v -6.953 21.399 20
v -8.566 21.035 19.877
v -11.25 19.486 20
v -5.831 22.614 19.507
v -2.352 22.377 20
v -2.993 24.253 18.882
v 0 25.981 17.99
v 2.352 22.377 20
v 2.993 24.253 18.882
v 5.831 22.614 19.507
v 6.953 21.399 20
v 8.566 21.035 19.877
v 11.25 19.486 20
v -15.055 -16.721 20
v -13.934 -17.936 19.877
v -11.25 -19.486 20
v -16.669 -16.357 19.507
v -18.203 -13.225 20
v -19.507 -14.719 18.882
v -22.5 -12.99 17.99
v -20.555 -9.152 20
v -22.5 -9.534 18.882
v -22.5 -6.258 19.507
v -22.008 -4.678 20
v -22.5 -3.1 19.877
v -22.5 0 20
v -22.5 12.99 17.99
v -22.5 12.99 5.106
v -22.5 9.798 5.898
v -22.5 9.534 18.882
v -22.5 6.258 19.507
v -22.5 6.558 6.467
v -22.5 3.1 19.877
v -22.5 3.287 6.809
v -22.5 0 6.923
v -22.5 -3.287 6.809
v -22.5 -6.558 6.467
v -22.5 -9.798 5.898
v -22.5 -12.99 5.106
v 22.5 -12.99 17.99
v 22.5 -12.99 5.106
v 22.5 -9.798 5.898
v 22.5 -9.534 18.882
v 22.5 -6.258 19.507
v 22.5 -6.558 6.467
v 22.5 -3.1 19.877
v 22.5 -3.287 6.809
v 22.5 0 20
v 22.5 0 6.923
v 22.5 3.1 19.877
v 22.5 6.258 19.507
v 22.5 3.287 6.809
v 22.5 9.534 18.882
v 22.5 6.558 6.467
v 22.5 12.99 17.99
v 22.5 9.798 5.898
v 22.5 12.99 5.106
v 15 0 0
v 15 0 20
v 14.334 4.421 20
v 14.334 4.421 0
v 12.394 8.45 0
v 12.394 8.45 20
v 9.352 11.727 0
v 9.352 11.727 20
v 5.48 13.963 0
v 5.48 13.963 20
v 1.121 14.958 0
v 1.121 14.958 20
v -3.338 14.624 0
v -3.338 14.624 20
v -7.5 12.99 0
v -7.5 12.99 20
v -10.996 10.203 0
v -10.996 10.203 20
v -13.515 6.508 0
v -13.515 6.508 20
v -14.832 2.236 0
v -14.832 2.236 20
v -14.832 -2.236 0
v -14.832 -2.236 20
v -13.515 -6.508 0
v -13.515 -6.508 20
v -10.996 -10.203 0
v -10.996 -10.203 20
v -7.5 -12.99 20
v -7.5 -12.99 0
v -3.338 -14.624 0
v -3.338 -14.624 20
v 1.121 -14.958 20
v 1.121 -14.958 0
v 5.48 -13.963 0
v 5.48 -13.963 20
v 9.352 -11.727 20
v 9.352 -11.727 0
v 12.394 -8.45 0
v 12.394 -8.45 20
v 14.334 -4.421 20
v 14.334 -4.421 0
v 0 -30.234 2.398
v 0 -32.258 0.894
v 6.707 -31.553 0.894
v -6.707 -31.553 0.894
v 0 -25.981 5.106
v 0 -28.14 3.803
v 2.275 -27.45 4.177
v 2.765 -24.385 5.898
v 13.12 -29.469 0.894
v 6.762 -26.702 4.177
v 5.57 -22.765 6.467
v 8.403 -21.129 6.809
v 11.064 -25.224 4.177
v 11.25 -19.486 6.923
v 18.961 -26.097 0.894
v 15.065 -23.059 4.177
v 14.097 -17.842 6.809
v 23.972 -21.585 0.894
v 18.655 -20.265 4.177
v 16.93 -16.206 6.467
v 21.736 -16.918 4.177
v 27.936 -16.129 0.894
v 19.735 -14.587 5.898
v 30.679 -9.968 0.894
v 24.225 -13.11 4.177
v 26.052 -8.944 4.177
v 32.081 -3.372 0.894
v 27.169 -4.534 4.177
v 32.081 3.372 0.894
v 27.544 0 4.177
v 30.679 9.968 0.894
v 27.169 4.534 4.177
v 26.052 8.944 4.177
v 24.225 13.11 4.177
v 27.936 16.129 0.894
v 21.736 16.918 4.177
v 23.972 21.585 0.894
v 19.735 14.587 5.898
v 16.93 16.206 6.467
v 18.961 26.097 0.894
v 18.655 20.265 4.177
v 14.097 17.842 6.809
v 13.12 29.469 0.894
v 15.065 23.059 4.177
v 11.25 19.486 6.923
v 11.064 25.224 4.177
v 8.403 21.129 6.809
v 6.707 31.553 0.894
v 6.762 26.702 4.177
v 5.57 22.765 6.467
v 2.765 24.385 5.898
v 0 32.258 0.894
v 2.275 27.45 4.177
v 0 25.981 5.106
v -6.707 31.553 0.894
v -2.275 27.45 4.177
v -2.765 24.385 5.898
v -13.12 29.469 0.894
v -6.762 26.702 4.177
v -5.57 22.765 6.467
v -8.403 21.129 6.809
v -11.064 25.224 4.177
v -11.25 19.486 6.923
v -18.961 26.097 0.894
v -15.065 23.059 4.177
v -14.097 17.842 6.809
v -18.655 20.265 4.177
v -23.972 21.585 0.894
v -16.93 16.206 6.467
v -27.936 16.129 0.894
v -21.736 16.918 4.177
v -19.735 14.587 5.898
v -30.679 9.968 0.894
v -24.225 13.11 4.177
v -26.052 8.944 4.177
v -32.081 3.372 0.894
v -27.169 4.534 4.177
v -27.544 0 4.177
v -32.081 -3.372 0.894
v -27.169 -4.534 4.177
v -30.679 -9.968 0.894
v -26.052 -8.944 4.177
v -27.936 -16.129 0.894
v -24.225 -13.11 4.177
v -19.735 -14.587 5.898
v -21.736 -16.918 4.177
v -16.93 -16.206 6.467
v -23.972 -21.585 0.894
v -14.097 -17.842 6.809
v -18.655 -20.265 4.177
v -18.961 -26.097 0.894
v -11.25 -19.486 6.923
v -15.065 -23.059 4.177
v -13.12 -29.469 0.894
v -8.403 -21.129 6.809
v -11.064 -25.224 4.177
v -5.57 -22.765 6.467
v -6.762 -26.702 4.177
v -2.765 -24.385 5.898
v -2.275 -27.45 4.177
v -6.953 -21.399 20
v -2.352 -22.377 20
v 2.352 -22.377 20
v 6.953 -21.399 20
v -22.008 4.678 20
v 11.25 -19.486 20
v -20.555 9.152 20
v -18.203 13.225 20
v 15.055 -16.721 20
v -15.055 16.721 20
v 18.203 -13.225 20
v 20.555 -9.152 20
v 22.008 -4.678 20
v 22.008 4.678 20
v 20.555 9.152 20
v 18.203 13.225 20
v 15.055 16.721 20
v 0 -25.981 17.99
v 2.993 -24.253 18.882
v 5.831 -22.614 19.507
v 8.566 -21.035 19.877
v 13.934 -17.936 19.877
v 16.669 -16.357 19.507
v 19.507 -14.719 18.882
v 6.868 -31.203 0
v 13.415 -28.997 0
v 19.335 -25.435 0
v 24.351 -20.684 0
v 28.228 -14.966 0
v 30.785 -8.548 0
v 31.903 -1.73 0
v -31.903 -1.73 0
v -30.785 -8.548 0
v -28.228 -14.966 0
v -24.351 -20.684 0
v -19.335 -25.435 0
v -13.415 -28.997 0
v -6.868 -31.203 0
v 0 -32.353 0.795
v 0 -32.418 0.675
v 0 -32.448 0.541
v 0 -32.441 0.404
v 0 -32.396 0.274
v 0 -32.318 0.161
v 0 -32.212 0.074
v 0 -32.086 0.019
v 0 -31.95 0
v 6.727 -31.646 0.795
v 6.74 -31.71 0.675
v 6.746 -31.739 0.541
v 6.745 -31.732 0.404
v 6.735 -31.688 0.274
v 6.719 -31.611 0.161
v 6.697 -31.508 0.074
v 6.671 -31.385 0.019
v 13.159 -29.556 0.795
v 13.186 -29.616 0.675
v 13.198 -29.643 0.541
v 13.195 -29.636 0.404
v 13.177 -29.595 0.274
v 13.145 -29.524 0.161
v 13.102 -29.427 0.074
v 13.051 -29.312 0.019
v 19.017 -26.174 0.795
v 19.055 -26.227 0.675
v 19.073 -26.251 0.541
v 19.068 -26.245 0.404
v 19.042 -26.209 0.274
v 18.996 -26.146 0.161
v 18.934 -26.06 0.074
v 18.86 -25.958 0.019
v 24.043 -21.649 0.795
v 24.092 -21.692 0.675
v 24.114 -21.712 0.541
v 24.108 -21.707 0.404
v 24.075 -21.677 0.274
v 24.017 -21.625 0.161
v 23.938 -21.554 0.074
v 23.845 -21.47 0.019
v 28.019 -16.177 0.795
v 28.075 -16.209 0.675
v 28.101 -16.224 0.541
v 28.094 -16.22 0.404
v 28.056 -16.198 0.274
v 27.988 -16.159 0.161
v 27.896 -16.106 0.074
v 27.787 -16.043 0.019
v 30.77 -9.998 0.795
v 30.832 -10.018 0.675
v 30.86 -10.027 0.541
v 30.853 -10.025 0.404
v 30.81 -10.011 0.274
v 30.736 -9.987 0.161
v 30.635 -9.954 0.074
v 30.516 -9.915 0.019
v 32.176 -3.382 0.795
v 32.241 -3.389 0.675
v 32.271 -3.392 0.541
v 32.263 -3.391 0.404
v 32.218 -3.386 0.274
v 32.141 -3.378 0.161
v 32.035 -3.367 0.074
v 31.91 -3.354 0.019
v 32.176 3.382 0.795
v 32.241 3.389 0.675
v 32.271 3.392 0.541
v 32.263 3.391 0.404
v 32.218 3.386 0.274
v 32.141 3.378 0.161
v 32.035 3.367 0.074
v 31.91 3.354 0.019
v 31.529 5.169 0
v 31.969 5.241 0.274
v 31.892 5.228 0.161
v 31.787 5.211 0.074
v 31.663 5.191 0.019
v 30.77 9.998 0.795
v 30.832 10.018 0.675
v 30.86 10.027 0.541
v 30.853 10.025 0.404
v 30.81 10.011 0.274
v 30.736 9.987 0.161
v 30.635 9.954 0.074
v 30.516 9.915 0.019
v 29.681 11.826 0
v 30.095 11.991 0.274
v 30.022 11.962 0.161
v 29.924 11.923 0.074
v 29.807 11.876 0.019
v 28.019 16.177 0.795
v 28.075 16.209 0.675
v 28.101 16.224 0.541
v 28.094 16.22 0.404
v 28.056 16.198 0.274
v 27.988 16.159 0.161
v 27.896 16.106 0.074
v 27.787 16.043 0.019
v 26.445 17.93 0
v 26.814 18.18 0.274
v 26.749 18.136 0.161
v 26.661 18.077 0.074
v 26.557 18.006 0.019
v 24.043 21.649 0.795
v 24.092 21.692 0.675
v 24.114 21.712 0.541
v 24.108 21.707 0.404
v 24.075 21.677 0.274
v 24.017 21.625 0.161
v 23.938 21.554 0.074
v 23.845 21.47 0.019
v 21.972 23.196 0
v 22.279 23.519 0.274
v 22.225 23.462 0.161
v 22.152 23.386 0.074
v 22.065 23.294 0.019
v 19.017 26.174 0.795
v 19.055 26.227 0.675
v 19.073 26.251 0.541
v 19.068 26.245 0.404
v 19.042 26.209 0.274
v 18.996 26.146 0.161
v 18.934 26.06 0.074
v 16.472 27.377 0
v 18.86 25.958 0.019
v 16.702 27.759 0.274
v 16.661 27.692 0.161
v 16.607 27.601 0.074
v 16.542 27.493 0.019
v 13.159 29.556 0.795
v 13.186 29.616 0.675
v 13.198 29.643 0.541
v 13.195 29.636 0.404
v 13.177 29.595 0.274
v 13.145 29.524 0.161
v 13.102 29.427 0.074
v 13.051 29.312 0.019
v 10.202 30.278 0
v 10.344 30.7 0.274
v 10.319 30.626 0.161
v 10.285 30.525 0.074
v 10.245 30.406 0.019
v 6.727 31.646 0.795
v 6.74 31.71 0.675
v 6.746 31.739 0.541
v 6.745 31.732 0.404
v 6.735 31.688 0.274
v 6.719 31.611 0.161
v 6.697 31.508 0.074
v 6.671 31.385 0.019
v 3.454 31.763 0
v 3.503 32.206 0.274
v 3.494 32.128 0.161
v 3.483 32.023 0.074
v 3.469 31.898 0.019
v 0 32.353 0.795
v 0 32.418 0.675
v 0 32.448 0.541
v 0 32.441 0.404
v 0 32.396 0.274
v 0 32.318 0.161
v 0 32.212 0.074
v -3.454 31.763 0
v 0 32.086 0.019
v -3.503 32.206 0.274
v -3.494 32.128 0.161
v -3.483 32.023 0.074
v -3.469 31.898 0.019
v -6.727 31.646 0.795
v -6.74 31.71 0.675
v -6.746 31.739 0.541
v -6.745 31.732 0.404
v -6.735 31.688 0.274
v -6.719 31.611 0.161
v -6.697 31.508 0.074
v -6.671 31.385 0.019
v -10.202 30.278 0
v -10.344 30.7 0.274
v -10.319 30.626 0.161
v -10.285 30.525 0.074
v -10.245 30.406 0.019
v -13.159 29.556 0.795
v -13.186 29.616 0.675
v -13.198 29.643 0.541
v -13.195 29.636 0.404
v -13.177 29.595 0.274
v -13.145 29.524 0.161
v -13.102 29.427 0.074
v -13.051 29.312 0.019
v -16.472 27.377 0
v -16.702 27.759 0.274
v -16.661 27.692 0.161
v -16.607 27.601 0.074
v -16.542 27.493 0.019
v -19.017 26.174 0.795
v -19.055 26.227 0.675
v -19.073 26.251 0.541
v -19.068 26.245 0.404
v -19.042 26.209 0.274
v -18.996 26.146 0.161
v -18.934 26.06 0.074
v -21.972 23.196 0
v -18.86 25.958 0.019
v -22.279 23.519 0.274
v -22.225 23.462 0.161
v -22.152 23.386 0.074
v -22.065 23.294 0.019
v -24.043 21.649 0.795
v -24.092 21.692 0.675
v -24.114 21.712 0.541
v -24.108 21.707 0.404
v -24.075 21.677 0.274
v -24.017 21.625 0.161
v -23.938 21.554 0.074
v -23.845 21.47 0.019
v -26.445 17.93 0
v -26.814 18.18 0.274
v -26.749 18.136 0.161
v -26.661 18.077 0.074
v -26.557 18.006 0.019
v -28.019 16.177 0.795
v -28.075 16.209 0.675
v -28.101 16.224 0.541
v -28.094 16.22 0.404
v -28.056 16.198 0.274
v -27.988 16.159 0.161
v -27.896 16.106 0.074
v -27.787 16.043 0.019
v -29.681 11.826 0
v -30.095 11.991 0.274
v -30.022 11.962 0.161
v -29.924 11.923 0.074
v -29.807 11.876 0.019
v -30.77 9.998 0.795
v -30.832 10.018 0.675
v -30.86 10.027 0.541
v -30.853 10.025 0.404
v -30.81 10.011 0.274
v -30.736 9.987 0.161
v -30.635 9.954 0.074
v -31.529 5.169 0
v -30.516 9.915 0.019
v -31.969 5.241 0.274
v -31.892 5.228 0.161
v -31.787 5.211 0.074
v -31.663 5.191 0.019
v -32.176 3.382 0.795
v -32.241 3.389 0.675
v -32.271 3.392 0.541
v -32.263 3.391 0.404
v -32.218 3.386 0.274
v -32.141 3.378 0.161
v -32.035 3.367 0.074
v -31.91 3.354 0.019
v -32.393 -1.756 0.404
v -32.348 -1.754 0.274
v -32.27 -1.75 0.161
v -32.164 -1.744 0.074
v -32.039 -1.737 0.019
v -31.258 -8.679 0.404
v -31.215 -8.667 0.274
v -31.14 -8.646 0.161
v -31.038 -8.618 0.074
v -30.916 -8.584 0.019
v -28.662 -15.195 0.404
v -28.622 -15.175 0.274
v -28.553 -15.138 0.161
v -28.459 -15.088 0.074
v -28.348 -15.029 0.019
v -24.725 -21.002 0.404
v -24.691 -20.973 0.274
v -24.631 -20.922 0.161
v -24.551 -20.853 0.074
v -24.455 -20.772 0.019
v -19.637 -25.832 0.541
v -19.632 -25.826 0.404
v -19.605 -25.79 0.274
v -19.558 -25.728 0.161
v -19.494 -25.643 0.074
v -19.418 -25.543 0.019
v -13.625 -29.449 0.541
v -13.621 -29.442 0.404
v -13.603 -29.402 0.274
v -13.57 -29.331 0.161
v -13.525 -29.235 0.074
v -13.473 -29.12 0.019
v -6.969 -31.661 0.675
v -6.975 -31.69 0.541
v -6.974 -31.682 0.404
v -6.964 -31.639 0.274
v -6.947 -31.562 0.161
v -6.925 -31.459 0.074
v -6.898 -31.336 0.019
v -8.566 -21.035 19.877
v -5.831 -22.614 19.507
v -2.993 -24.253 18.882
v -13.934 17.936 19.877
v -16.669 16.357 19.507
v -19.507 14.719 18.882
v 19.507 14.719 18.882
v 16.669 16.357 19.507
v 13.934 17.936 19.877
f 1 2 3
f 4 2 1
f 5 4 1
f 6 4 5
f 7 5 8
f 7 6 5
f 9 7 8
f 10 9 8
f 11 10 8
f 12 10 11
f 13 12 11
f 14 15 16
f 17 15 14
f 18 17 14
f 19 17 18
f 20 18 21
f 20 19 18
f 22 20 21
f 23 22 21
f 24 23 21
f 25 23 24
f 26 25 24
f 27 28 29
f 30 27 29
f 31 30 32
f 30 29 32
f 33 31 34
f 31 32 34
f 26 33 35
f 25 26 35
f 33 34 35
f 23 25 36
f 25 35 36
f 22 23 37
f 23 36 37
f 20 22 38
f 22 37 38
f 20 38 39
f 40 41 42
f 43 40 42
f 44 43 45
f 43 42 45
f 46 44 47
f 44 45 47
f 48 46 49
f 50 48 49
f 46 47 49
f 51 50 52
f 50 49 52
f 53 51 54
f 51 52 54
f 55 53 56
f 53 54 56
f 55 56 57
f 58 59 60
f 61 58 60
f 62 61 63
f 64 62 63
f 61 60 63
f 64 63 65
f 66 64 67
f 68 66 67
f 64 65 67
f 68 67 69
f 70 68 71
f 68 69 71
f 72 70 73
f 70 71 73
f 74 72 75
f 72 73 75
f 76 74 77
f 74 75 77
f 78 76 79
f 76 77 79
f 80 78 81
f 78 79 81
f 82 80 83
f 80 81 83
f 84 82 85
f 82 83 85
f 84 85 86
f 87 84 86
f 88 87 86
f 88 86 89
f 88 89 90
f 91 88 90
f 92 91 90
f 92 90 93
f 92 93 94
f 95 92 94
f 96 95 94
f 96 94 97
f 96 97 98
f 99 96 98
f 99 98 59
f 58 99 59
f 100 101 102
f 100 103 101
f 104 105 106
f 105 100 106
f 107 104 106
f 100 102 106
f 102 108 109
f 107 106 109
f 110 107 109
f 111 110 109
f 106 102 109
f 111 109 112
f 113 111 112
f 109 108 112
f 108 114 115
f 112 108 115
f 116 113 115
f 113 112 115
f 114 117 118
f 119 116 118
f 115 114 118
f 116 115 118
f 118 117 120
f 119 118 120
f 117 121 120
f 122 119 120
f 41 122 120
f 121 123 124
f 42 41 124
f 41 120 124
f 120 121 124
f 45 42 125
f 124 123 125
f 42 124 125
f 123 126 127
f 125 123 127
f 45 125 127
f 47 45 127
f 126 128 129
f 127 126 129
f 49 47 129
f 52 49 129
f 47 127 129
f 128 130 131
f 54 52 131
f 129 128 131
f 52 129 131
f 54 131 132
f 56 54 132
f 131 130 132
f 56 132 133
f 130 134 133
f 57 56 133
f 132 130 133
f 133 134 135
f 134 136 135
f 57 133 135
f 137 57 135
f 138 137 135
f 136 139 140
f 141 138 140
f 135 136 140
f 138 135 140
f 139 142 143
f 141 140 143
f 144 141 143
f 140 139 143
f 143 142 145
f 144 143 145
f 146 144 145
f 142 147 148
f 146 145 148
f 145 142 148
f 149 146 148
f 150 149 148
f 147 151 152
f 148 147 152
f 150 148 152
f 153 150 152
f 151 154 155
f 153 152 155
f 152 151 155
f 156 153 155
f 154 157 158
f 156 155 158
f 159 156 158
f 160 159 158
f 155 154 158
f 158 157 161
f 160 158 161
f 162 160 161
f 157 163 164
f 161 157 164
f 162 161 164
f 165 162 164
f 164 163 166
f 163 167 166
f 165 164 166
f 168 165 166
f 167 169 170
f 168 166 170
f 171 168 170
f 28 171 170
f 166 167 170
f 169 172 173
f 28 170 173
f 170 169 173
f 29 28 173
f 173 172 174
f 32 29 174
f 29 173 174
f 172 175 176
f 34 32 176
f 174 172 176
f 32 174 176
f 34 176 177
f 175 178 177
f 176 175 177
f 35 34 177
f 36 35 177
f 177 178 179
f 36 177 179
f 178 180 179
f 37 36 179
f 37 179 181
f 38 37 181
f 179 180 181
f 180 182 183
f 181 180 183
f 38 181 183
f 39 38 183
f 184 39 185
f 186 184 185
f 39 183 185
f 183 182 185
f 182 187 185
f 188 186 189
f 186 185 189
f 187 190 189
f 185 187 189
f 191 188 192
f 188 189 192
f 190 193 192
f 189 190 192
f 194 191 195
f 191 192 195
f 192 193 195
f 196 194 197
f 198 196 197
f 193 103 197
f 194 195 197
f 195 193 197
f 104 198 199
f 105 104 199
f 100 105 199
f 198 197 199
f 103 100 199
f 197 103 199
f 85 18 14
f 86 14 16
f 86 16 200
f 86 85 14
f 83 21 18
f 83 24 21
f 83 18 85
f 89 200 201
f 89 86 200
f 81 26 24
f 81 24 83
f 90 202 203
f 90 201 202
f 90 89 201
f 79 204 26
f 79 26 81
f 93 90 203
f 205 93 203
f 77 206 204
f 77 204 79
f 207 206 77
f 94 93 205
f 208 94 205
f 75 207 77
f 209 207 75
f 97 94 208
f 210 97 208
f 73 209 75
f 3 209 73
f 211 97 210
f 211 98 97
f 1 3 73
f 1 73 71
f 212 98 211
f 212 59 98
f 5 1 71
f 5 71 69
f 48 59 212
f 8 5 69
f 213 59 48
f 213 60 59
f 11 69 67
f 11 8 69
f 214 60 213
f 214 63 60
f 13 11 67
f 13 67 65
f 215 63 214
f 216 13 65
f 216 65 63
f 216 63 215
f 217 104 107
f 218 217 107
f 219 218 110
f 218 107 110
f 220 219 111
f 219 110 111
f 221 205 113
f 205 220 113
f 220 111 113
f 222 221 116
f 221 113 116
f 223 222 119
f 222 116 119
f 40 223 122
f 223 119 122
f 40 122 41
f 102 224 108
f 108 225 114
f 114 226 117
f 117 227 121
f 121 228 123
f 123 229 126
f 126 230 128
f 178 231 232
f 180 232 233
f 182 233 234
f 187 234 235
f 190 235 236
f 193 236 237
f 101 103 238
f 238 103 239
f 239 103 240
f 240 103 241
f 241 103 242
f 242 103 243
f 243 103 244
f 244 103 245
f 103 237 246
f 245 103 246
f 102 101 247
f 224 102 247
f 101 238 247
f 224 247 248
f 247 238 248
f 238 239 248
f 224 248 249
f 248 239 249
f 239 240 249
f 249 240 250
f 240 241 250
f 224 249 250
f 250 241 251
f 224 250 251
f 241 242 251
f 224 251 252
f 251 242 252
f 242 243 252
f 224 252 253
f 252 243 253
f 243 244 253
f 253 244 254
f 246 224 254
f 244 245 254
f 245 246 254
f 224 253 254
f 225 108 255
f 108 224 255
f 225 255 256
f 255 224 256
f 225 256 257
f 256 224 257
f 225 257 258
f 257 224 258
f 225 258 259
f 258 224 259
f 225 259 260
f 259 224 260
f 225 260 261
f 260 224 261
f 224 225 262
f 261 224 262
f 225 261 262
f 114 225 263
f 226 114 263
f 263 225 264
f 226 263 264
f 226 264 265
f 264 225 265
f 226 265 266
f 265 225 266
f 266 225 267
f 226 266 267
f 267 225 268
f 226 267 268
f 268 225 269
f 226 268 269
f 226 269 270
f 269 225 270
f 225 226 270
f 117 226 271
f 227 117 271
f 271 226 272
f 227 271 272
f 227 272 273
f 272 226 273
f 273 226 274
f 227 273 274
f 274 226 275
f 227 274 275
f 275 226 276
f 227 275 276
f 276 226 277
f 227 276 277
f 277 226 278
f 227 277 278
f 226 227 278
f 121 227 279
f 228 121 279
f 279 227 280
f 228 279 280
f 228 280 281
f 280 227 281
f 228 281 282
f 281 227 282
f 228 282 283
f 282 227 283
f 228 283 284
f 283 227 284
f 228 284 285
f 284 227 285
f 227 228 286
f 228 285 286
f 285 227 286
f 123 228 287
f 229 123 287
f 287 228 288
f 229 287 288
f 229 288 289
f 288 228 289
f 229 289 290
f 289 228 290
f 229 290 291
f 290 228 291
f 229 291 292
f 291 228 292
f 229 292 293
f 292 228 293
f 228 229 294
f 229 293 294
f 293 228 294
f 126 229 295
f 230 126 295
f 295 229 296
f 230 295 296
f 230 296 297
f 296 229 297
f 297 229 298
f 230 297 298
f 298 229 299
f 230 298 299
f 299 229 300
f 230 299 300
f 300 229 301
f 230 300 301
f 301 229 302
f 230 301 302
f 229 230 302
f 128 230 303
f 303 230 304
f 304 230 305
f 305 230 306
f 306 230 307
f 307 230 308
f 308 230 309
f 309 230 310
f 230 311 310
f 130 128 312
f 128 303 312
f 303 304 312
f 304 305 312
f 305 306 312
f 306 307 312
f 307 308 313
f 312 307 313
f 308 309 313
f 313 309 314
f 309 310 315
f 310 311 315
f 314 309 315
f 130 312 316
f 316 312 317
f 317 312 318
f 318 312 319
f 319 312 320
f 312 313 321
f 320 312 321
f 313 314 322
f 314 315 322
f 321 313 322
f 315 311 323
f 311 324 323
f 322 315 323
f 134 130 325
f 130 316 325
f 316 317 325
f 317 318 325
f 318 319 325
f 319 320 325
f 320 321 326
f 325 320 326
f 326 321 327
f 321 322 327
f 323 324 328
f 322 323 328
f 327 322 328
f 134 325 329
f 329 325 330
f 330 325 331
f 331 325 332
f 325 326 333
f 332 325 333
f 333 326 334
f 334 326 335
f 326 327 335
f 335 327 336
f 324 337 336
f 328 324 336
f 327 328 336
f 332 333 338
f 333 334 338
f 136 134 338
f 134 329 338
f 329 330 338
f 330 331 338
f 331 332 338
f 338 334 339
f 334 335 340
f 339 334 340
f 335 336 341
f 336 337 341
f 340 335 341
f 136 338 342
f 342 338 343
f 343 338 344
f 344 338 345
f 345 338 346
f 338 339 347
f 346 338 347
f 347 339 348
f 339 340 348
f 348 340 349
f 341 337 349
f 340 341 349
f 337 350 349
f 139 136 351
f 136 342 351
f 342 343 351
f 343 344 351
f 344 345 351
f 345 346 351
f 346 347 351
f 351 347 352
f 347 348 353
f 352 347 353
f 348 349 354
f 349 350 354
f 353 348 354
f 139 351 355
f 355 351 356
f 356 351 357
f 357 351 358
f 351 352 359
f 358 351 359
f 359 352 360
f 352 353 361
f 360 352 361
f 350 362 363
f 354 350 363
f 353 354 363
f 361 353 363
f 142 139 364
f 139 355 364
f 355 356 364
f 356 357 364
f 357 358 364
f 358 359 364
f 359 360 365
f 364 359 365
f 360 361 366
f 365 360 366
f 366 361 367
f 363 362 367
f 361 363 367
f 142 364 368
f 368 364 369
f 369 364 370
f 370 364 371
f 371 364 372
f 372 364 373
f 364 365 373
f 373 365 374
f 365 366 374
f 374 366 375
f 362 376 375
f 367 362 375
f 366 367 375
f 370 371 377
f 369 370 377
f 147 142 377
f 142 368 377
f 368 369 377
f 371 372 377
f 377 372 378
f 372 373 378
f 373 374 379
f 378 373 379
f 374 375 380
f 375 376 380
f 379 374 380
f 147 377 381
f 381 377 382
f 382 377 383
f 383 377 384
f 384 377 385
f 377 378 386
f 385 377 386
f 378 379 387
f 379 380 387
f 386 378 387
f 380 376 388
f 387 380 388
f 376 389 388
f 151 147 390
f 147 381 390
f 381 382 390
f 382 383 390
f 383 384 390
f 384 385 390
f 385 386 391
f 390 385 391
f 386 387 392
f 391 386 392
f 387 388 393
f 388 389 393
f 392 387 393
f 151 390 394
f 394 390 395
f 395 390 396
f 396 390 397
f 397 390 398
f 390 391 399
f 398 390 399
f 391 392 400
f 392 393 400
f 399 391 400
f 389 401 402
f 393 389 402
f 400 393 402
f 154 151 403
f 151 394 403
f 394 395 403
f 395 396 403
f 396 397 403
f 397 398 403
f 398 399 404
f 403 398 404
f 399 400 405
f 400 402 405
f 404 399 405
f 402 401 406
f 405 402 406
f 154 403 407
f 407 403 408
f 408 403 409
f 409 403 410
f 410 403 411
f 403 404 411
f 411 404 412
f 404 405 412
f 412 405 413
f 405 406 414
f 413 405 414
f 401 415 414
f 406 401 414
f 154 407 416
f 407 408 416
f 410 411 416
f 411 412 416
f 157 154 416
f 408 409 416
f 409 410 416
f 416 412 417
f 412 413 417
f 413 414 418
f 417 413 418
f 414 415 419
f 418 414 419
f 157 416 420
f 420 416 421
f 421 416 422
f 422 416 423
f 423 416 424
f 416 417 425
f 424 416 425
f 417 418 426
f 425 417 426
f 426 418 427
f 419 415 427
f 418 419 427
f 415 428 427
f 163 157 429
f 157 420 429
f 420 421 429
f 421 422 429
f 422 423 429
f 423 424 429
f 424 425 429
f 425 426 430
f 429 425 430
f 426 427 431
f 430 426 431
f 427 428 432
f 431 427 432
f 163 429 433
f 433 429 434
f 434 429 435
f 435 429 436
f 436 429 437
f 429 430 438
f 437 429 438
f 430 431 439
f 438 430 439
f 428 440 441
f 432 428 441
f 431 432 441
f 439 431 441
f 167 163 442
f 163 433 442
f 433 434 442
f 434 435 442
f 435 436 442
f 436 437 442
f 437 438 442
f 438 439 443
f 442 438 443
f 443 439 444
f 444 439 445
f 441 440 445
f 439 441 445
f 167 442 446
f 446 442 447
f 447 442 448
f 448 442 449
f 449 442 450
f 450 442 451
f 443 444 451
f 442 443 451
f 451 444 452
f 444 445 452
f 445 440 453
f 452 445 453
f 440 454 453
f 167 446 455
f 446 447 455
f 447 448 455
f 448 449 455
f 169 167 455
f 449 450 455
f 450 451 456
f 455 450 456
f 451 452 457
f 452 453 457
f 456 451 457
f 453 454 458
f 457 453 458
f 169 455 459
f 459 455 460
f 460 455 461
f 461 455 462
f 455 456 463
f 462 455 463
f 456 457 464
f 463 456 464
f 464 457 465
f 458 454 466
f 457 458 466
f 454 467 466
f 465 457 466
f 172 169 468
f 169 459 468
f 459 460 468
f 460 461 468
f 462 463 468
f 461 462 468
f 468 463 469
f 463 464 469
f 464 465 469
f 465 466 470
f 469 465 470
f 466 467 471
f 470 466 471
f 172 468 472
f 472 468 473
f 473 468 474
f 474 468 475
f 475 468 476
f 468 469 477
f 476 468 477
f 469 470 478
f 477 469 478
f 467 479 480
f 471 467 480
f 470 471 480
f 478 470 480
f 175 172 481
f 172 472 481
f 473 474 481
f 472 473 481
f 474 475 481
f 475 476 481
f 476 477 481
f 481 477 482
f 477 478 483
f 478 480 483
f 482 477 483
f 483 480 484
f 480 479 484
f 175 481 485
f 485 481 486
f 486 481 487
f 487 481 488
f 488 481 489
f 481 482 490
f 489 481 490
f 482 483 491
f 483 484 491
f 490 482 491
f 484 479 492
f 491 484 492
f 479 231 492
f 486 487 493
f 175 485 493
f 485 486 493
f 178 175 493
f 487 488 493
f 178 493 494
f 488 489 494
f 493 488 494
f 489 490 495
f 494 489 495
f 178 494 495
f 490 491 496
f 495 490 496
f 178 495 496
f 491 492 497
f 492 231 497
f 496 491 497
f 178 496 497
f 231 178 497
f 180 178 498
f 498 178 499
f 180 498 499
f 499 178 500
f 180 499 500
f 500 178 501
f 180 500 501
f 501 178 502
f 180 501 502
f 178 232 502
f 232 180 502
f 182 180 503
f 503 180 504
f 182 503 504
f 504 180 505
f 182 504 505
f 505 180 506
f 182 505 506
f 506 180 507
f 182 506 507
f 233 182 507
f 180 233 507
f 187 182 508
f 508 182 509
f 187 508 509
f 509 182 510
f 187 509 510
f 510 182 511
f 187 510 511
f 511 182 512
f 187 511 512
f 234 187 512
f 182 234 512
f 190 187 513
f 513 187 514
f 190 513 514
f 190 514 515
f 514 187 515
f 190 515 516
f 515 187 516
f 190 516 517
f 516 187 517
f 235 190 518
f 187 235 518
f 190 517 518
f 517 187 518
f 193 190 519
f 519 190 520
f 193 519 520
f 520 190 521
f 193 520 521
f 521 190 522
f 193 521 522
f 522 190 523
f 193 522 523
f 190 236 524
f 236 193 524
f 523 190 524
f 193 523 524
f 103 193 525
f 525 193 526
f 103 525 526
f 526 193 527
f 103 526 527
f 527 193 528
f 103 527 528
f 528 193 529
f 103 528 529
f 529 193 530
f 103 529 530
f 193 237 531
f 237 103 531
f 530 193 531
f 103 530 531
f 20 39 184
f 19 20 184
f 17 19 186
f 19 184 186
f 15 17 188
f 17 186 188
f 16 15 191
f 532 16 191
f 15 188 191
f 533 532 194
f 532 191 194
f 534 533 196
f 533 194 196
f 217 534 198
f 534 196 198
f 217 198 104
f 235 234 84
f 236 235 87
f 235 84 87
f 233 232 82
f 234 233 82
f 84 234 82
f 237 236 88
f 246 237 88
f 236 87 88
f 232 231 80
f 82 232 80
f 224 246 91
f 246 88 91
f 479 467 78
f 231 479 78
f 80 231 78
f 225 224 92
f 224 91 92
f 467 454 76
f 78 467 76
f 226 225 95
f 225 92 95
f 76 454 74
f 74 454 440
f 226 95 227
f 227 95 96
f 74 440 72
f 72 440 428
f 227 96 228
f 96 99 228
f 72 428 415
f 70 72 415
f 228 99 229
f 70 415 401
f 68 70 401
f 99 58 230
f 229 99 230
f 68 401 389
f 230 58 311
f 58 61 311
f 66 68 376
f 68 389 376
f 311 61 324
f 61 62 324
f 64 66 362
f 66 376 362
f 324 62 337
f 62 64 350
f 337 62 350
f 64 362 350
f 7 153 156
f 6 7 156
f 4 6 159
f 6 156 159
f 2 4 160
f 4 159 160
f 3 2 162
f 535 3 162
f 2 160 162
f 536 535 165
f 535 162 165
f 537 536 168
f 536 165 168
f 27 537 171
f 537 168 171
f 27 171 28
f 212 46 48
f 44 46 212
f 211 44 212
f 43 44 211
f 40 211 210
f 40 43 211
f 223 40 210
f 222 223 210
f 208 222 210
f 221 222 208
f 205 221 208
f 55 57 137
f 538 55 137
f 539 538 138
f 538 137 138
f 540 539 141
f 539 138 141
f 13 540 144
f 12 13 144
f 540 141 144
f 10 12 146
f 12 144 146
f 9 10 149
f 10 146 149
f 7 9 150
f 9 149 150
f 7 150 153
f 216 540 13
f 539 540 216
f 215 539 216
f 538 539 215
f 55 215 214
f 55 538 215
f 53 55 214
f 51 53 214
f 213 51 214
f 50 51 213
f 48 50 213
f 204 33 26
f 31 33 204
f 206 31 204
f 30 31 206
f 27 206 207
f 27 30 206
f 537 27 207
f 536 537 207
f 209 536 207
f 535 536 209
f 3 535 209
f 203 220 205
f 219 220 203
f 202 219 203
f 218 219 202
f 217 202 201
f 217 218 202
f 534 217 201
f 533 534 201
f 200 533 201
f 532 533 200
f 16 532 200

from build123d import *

# Parameters (mm, degrees)
BOSS_EXTRUDE1_DEPTH = 20
SKETCH3_OUTSIDE_W   = 154.97
SKETCH3_OUTSIDE_H   = 154.97
SKETCH3_OUTSIDE_R   = 22.5
CUT_EXTRUDE1_DEPTH  = 20
CUT_EXTRUDE1_TAPER  = 60
CUT_EXTRUDE2_REACH  = 22
SKETCH4_R           = 15


with BuildPart() as part:
    # Sketch1 → Boss-Extrude1 (new body)
    with BuildSketch(Plane.XY):
        Polygon((0, 25.980762114), (-22.5, 12.990381057), (-22.5, -12.990381057), (0, -25.980762114), (22.5, -12.990381057), (22.5, 12.990381057), align=None)
    extrude(amount=BOSS_EXTRUDE1_DEPTH)

    # Sketch2 → Revolve2 (revolve)
    with BuildSketch(Plane(origin=(0, 0, 0), x_dir=(0, 0, -1), z_dir=(1, 0, 0))):
        with BuildLine():
            Line((0, 0), (-12, 0))
            ThreePointArc((-12, 0), (-9.145772075, -17.058051419), (-0.894027207, -32.257802794))
            ThreePointArc((-0.894027207, -32.257802794), (-0.337232687, -32.42276506), (0, -31.95))
            Line((0, -31.95), (0, 0))
        make_face()
    revolve(axis=Axis((0, 0, 0), (0, 0, 1)))

    # Sketch3 outside → Cut-Extrude1 (cut)
    with BuildSketch(Plane.XY.offset(20)):
        Rectangle(SKETCH3_OUTSIDE_W, SKETCH3_OUTSIDE_H)
        Circle(SKETCH3_OUTSIDE_R, mode=Mode.SUBTRACT)
    extrude(amount=-CUT_EXTRUDE1_DEPTH, taper=CUT_EXTRUDE1_TAPER, mode=Mode.SUBTRACT)

    # Sketch4 → Cut-Extrude2 (cut, up to next)
    with BuildSketch(Plane.XY.offset(20), mode=Mode.PRIVATE) as cut_extrude2_sk1:
        Circle(SKETCH4_R)
    cut_extrude2_tool1 = extrude(cut_extrude2_sk1.sketch, amount=-CUT_EXTRUDE2_REACH, mode=Mode.PRIVATE) & part.part
    add(cut_extrude2_tool1.solids().sort_by_distance((0, 0, 20))[0], mode=Mode.SUBTRACT)


solid = part.part
